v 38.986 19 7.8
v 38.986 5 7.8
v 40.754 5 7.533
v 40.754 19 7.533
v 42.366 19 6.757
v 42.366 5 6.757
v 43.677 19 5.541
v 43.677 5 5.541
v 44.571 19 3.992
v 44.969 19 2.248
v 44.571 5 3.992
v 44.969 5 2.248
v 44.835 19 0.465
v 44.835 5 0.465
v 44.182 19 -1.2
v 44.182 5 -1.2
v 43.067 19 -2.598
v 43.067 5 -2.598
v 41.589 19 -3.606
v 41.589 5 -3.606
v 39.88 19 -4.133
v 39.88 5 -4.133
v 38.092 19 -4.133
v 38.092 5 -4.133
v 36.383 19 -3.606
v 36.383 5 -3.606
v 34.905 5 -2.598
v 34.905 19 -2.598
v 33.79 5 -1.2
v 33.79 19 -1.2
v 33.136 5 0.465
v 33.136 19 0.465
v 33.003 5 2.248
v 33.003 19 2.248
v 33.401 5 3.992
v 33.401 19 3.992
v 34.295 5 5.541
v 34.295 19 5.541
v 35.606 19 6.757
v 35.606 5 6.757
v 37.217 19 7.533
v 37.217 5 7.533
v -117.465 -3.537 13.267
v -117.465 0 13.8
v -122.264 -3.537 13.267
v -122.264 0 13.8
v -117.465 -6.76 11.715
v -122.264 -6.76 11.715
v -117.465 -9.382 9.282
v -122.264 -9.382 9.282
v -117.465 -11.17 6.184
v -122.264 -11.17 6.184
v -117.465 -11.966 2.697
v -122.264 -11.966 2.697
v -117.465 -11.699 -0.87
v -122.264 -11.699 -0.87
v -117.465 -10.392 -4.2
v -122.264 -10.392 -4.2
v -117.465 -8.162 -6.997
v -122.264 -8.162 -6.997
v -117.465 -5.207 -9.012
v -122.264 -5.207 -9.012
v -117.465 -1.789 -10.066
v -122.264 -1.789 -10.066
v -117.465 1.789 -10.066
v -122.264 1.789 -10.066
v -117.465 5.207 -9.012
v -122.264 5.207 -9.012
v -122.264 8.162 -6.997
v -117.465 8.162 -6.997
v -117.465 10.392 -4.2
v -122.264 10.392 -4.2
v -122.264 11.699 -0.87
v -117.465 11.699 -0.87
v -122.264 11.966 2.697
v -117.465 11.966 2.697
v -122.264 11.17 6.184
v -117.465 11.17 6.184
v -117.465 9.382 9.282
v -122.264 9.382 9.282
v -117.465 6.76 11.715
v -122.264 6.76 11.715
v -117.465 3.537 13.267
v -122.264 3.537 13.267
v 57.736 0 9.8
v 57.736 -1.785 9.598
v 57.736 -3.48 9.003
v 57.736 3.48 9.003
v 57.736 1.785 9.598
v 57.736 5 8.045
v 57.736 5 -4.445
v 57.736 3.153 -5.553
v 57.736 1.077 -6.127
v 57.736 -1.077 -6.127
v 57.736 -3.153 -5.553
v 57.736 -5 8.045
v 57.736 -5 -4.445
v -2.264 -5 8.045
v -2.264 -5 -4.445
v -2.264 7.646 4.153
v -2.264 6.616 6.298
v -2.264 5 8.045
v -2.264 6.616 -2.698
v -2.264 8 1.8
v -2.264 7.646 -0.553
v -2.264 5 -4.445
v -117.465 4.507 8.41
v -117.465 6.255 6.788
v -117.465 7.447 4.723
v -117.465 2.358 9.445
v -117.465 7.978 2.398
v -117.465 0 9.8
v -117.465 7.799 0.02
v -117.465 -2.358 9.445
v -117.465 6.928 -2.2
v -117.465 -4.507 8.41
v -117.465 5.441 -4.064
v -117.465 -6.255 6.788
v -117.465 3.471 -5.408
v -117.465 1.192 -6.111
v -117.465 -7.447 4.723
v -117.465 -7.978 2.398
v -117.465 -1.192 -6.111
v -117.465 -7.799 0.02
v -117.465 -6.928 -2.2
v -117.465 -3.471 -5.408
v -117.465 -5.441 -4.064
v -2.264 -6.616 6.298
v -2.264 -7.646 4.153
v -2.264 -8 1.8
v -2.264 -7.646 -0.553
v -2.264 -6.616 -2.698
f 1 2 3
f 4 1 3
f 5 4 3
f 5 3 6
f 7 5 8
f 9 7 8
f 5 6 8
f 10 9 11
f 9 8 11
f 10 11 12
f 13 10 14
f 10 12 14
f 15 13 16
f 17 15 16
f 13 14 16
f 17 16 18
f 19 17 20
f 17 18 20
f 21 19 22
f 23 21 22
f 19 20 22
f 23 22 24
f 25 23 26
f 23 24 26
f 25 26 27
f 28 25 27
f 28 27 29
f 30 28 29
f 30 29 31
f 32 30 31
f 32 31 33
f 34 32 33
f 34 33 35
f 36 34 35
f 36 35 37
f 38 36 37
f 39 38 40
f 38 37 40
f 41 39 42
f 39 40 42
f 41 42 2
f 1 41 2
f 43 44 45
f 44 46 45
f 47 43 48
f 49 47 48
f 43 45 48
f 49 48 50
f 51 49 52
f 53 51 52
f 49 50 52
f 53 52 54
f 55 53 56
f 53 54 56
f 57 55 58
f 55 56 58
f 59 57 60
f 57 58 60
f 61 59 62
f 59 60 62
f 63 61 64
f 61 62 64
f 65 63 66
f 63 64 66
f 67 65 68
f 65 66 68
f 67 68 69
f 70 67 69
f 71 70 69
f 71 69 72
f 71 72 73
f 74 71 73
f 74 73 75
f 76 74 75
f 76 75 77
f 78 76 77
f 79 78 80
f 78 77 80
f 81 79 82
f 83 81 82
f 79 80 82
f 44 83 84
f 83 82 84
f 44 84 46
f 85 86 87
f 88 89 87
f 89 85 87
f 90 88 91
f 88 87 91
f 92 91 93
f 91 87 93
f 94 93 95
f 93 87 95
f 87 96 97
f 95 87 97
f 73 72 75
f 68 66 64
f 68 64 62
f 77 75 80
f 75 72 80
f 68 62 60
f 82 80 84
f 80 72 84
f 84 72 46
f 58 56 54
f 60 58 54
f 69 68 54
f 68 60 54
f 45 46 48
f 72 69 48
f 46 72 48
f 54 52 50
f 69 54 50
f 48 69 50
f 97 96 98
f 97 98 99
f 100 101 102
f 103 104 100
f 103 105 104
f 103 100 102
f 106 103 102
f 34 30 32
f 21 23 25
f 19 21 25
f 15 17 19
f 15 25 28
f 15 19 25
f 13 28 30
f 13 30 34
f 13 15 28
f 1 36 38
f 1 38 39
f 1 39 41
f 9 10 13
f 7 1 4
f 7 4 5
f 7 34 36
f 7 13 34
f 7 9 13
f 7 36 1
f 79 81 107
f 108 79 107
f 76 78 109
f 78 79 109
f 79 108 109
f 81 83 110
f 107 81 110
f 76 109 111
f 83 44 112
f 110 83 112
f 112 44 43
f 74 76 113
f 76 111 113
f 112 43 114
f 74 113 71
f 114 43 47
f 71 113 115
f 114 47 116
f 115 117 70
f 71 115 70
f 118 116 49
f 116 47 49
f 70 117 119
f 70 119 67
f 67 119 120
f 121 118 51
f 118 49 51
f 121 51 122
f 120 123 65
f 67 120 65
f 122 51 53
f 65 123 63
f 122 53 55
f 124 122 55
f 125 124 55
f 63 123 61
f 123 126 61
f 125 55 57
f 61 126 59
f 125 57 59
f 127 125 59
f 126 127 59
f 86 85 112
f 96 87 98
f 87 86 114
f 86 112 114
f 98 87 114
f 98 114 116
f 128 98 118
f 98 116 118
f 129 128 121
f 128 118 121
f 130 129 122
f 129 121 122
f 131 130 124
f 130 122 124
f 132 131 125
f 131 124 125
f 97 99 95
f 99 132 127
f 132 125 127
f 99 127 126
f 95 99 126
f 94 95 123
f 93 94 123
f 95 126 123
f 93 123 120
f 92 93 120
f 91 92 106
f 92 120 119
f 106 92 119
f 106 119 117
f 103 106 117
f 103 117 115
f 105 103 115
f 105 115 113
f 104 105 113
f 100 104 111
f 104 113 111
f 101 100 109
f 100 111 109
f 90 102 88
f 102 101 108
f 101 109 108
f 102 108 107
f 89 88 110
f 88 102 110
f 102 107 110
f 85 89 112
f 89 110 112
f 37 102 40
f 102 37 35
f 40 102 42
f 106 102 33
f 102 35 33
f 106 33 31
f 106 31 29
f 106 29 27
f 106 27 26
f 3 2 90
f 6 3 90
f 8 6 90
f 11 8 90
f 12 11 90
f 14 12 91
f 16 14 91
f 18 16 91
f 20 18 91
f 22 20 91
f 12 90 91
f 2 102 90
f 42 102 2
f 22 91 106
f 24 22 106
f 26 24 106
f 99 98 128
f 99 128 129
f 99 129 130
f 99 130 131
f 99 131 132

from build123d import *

# Parameters (mm, degrees)
SKETCH4_OUTSIDE_W   = 62.634
SKETCH4_OUTSIDE_H   = 62.634
SKETCH4_OUTSIDE_W_2 = 33.924910587
SKETCH4_OUTSIDE_H_2 = 10
CUT_EXTRUDE1_DEPTH  = 60
SKETCH9_R           = 6
BOSS_EXTRUDE1_DEPTH = 14


with BuildPart() as part:
    # Sketch1 → Revolve1 (revolve)
    with BuildSketch(Plane(origin=(0, 0, 0), x_dir=(1, 0, 0), z_dir=(0, 1, 0))):
        Polygon((57.735849057, -1.8), (57.735849057, 6.2), (-117.46468802, 6.2), (-117.46468802, 10.2), (-122.264150943, 10.2), (-122.264150943, -1.8), align=None)
    revolve(axis=Axis((-122.264150943, 0, 1.8), (1, 0, 0)))

    # Sketch4 outside → Cut-Extrude1 (cut)
    with BuildSketch(Plane(origin=(57.735849057, 0, 0), x_dir=(0, 0, -1), z_dir=(1, 0, 0))):
        with Locations((-1.8, 0)):
            Rectangle(SKETCH4_OUTSIDE_W, SKETCH4_OUTSIDE_H)
        with Locations((-4.763294948, 0)):
            Rectangle(SKETCH4_OUTSIDE_W_2, SKETCH4_OUTSIDE_H_2, mode=Mode.SUBTRACT)
    extrude(amount=-CUT_EXTRUDE1_DEPTH, mode=Mode.SUBTRACT)

    # Sketch9 → Boss-Extrude1 (add)
    with BuildSketch(Plane(origin=(0, 5, 0), x_dir=(1, 0, 0), z_dir=(0, 1, 0))):
        with Locations((38.985849057, -1.8)):
            Circle(SKETCH9_R)
    extrude(amount=BOSS_EXTRUDE1_DEPTH)


solid = part.part
